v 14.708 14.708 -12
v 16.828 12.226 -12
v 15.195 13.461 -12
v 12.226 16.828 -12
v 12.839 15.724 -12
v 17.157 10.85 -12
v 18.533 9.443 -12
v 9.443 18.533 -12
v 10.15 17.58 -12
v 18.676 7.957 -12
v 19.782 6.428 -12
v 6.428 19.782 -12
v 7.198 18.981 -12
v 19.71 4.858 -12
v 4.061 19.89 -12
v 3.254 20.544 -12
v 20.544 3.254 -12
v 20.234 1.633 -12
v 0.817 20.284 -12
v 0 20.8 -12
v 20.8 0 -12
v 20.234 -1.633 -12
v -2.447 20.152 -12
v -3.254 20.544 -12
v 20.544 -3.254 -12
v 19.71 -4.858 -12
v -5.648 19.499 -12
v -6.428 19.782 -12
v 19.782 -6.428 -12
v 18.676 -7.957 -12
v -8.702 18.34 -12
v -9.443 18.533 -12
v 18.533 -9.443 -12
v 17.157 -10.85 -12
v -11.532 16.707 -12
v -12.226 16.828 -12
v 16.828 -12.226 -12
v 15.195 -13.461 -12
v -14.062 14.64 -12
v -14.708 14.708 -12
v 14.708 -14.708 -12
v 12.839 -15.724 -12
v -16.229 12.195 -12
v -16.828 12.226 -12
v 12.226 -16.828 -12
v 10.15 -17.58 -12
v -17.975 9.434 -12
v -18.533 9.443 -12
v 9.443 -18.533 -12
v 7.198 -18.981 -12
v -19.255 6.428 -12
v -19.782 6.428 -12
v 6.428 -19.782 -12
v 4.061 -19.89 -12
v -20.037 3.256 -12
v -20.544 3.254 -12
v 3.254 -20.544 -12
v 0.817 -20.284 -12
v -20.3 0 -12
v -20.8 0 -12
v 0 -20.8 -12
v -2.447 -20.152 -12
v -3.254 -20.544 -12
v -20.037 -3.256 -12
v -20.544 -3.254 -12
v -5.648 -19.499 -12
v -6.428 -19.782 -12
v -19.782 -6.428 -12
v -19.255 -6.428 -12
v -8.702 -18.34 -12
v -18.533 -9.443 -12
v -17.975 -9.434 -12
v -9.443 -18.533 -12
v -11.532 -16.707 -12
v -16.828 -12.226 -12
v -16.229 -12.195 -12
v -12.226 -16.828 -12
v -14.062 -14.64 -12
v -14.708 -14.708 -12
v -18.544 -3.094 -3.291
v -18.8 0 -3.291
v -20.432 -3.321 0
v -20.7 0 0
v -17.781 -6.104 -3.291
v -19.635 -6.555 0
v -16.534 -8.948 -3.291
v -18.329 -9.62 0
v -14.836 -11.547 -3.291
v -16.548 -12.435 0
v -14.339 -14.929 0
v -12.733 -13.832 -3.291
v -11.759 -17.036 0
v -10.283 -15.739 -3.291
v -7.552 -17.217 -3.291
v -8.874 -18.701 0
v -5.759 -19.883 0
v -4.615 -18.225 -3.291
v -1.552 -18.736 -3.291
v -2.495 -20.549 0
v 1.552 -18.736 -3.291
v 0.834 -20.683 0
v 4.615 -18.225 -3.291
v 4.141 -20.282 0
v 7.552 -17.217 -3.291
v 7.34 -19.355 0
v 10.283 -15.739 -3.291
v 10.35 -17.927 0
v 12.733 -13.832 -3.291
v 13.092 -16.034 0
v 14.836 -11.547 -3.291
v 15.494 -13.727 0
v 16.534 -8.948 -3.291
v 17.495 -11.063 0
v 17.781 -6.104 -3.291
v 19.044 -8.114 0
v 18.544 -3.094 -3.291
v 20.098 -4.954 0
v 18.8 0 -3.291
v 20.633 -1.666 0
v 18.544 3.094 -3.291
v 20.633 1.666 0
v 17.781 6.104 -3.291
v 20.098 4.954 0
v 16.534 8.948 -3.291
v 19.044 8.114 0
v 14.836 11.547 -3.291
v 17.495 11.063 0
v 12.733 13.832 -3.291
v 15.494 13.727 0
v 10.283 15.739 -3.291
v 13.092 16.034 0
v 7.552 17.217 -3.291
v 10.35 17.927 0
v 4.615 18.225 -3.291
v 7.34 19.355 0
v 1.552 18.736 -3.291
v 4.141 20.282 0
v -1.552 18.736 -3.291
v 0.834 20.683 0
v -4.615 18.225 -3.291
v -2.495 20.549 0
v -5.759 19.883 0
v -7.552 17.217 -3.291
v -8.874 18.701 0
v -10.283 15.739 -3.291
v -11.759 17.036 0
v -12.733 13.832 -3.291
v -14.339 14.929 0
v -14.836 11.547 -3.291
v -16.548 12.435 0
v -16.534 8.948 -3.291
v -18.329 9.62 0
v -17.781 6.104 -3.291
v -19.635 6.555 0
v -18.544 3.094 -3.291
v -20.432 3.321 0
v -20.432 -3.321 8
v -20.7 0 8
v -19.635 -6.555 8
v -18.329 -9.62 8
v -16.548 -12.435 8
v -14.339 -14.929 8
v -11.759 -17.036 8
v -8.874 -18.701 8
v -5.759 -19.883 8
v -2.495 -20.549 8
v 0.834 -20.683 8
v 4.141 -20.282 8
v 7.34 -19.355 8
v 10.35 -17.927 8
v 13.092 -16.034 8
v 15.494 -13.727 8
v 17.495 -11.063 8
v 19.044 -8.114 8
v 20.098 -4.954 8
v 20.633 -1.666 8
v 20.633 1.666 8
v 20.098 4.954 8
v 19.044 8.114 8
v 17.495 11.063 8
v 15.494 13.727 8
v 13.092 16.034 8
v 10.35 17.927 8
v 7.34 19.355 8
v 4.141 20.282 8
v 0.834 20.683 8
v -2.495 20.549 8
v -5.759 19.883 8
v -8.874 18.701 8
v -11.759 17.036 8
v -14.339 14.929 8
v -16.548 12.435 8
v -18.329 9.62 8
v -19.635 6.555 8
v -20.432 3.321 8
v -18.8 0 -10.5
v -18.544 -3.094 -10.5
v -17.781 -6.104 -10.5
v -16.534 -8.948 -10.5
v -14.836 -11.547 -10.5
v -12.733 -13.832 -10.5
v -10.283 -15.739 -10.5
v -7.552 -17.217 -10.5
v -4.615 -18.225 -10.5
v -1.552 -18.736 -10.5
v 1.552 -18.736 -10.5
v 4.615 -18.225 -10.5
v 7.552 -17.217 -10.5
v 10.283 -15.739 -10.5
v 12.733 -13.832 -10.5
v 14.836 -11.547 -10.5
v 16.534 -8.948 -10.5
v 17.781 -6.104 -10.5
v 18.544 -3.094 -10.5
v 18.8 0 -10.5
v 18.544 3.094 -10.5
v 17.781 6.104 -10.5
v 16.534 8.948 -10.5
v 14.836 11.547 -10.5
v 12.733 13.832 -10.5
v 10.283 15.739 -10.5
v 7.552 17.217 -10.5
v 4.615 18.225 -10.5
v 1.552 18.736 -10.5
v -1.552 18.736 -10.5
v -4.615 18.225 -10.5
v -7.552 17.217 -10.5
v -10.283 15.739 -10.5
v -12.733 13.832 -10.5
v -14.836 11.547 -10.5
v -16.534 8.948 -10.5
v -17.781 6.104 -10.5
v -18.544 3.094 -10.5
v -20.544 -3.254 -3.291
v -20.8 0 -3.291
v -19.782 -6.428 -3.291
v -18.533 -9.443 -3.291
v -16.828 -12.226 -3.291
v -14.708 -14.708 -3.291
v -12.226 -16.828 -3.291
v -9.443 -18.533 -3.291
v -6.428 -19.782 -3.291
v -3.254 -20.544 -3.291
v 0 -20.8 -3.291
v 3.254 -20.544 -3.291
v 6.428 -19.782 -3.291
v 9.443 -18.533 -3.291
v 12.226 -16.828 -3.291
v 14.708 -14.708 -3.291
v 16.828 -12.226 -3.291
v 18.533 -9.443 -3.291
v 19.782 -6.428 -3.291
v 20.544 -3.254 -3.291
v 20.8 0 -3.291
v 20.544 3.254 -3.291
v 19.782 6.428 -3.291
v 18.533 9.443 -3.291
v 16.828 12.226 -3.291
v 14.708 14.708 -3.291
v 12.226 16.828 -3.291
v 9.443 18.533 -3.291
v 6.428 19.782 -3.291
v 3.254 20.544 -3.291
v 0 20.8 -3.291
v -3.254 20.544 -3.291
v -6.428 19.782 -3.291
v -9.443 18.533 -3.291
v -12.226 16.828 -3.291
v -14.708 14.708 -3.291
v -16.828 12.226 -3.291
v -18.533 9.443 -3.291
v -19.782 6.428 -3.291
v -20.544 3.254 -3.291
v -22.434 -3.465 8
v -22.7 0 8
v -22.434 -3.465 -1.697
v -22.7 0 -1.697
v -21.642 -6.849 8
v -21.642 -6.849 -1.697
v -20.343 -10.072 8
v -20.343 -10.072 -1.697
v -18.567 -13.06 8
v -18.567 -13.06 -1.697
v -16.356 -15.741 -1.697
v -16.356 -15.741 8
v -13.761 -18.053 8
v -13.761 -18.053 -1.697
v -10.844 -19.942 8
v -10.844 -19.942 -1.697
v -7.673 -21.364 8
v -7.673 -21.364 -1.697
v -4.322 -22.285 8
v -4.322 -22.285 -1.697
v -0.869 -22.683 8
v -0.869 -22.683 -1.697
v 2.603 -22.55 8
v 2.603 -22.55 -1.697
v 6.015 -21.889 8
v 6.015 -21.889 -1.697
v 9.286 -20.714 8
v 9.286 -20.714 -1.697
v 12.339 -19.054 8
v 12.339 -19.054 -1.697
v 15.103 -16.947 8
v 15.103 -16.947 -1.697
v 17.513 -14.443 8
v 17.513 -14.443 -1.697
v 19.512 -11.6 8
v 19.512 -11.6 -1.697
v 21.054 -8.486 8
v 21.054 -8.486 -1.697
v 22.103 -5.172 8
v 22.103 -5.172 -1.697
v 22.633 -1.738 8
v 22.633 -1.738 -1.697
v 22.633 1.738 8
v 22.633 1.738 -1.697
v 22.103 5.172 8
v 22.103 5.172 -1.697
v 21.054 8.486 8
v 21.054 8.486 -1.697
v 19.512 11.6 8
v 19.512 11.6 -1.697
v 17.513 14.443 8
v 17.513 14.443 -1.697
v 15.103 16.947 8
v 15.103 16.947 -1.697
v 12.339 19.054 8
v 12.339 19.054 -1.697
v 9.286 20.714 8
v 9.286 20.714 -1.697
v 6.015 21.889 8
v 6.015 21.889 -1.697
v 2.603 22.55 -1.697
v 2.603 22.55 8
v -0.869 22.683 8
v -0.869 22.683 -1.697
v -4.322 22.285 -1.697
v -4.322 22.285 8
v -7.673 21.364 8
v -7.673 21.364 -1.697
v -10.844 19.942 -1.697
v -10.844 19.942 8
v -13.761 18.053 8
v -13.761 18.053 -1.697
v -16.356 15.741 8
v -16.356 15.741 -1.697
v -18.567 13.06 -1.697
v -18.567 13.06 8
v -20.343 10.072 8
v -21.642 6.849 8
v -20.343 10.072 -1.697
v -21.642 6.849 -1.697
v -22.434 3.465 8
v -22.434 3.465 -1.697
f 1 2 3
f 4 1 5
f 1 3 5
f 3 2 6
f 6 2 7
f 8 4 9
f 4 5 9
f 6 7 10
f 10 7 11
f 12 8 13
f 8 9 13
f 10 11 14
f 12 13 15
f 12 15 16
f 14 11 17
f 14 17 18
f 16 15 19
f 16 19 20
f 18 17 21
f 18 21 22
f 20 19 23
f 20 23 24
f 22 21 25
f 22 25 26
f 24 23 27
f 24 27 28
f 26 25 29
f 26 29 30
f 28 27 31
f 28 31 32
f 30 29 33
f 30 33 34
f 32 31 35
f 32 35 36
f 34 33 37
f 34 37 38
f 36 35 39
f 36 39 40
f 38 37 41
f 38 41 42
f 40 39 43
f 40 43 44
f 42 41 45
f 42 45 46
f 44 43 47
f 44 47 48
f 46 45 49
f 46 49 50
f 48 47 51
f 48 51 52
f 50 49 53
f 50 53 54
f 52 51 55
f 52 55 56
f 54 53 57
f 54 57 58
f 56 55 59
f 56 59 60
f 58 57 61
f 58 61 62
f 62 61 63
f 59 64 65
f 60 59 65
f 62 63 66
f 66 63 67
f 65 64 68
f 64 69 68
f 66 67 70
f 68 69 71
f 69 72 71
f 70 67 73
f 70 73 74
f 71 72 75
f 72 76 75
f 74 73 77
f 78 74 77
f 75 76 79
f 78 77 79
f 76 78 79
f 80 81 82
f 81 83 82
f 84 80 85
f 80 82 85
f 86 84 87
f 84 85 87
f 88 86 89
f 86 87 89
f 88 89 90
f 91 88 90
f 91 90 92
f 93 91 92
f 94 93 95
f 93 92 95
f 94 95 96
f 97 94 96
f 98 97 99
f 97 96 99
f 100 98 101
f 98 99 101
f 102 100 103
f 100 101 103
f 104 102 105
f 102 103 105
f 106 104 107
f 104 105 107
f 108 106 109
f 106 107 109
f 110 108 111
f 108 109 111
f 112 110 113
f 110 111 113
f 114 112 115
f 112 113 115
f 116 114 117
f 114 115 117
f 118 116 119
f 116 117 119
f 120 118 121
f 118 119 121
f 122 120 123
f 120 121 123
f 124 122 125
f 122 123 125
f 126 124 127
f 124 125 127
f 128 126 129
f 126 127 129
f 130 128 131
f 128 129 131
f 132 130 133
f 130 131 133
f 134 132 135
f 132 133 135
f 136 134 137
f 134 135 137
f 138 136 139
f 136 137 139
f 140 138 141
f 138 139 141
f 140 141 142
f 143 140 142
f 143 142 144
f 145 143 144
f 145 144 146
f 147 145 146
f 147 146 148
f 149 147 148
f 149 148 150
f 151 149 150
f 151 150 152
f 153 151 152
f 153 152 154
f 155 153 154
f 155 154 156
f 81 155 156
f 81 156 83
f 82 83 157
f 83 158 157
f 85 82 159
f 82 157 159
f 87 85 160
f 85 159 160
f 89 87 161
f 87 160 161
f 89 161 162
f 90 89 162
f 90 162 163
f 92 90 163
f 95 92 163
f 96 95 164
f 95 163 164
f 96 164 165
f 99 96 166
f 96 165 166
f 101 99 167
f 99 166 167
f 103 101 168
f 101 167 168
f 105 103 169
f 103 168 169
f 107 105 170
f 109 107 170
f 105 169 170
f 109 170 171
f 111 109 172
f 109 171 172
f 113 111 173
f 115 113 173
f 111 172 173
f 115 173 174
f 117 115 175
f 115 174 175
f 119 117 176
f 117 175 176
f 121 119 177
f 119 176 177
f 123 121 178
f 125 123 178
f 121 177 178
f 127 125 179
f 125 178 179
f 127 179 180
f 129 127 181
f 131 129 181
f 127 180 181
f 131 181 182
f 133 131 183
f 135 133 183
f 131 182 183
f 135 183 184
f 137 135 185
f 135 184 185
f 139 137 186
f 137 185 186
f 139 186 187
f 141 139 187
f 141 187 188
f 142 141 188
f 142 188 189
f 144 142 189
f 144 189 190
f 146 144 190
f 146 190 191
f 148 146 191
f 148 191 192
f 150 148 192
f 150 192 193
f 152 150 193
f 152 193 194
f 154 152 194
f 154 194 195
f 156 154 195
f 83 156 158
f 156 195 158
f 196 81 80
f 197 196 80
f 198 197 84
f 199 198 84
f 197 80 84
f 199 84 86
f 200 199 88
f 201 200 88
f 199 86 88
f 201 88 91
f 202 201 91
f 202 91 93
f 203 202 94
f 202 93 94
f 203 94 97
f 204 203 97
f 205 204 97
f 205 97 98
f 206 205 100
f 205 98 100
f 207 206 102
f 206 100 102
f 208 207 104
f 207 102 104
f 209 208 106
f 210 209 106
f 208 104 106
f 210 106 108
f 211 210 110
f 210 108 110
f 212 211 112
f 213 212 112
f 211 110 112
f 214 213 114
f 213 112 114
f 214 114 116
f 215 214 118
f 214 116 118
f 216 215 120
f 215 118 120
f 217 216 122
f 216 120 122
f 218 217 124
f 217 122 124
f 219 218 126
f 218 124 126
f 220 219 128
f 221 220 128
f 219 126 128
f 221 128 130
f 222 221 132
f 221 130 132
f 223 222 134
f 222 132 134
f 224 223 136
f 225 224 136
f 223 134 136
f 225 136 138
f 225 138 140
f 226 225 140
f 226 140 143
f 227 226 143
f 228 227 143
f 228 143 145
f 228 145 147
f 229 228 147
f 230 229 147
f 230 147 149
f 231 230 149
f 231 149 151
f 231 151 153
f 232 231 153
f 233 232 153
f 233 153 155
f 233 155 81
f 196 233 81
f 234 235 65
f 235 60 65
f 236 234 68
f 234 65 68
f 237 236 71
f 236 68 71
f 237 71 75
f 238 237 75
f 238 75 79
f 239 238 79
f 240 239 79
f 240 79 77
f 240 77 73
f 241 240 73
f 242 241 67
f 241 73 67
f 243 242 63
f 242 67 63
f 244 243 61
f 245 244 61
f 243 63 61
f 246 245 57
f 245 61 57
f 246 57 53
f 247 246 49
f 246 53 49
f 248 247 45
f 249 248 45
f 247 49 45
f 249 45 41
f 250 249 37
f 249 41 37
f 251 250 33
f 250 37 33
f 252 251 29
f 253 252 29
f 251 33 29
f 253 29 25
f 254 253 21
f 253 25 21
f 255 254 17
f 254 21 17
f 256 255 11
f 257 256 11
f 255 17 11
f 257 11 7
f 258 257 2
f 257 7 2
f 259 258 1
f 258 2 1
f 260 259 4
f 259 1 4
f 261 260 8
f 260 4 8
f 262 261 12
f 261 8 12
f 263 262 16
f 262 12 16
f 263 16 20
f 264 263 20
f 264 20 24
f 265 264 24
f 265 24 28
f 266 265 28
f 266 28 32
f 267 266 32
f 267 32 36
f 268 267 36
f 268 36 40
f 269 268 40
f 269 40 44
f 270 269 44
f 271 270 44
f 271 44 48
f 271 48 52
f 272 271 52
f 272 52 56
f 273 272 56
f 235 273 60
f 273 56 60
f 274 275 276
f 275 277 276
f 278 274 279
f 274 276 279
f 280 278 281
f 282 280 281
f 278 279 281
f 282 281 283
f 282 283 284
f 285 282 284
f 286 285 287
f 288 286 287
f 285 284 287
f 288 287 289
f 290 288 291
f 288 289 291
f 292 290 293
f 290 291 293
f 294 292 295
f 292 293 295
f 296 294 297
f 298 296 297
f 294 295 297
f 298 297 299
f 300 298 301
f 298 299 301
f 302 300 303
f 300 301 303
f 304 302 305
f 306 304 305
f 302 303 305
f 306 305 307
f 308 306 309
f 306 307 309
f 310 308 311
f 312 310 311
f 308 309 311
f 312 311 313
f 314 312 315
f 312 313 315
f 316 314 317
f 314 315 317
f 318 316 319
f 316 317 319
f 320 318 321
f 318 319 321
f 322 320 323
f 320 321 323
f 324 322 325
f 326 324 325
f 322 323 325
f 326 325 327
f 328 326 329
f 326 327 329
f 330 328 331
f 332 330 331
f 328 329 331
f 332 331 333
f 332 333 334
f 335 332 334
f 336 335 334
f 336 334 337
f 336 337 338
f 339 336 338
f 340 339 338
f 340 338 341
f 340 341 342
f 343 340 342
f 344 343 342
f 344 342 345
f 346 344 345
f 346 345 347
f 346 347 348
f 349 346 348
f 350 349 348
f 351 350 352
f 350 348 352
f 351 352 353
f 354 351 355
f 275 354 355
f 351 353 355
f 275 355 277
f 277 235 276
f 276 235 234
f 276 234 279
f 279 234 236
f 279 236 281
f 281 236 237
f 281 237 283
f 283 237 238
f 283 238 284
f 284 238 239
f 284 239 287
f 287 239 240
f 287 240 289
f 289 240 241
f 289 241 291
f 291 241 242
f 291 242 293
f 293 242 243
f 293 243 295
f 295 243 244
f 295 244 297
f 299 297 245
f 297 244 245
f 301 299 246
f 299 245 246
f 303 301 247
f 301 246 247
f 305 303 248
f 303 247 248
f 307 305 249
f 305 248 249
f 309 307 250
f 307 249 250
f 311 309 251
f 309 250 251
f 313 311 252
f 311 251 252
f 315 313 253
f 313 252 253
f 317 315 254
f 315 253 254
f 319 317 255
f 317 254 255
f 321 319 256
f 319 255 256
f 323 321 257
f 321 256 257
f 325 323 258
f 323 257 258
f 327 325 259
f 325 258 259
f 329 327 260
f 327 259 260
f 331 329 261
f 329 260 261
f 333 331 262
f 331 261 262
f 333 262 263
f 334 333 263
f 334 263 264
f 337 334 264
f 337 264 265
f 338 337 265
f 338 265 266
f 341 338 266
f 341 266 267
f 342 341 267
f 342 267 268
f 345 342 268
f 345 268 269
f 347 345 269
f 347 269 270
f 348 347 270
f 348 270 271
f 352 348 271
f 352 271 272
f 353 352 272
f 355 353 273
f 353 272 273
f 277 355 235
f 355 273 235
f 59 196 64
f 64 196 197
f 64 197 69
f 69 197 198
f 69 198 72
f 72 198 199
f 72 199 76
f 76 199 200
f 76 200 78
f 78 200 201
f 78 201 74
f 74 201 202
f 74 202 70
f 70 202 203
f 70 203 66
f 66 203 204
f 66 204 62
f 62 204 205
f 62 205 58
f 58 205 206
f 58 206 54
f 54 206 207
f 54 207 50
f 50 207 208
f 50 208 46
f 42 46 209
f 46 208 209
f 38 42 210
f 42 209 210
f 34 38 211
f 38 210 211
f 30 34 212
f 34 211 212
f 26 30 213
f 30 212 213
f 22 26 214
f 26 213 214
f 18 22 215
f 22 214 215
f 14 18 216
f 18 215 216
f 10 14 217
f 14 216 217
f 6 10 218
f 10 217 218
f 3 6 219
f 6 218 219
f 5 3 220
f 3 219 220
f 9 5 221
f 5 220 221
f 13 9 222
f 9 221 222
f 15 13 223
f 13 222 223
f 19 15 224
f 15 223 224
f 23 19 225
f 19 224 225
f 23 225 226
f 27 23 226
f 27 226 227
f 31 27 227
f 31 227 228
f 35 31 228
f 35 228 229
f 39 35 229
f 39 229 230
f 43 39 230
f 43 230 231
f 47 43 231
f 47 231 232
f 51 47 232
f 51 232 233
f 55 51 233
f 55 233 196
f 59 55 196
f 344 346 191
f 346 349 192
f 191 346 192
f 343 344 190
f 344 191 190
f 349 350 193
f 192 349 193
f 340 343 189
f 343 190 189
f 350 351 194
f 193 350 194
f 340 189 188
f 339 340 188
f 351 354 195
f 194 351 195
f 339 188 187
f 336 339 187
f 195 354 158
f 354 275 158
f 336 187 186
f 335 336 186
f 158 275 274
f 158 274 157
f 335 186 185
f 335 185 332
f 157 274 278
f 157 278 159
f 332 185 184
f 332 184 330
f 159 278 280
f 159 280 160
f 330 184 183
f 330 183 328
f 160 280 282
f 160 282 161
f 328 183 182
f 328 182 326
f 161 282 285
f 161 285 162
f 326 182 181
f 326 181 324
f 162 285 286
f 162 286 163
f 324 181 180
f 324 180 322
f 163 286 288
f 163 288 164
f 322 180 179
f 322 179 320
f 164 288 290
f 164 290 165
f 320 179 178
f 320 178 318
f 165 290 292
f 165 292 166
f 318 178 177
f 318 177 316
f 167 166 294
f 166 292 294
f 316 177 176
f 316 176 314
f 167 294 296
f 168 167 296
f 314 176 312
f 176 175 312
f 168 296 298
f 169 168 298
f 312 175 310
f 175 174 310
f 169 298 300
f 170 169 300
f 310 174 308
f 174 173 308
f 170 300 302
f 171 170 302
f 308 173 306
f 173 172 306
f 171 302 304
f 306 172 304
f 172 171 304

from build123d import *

# Parameters (mm, degrees)
F2_SIZE = 1.5


with BuildPart() as f1:
    # F0 (on Front) → F1 (revolve)
    with BuildSketch(Plane.XZ):
        Polygon((-20.7, 8), (-22.7, 8), (-22.7, -1.696607), (-20.8, -3.290897), (-20.8, -12), (-18.8, -12), (-18.8, -3.290897), (-20.7, 0), align=None)
    revolve(axis=Axis((0, 0, 4.153483), (0, 0, 1)))

    # F2
    f2_edges = [f1.edges().sort_by_distance(p)[0] for p in [
        (18.8, 0, -12),
    ]]
    chamfer(f2_edges, length=F2_SIZE)


solid = f1.part
